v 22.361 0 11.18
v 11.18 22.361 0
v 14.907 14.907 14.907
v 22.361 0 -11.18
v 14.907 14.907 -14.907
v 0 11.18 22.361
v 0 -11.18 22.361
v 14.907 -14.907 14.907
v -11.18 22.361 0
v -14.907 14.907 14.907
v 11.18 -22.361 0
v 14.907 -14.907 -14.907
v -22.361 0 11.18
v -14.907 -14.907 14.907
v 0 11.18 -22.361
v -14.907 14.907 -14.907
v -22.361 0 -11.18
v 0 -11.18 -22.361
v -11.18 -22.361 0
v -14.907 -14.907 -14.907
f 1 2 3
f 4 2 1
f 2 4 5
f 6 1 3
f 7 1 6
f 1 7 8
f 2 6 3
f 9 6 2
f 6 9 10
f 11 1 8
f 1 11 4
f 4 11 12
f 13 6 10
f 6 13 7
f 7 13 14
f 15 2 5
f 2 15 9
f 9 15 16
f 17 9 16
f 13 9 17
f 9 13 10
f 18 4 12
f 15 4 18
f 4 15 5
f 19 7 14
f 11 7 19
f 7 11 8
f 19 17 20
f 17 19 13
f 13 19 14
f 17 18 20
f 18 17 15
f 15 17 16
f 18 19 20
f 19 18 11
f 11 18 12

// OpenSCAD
/*
  crystal solids via Miller indices 
  
   see http://kitwallace.tumblr.com/tagged/crystal 
   
   Kit Wallace October 2015
   
   systems
       cubic - complete 
       tetra  - only one class
   
   todo
      remaining classes
      deduce modifiers from crystal class   
      twinning
      get right/left or positive/negative terminology right 
*/


// some constants
PHI = (1 + sqrt(5))/2;

K=tan(60);

COLORS=["red","green","blue","gold","silver","pink","lightblue","orange","lightgreen","white"];

// basic functions

function flatten(l) = [ for (a = l) for (b = a) b ] ;

function vcontains(val,list) =
     search([val],list)[0] != [];
       
function distinct(list,dlist=[],i=0) =  // return only distinct items of list
      i==len(list)
         ? dlist
         : vcontains(list[i],dlist)
             ? distinct(list,dlist,i+1)
             : distinct(list,concat(dlist,[list[i]]),i+1)
      ;

function sum(list,i=0) =  
      i < len(list)
        ?  list[i] + sum(list,i+1)
        :  0;

// solid construction
  
module orient_to(centre, normal) {   
      translate(centre)
      rotate([0, 0, atan2(normal.y, normal.x)]) //rotation
      rotate([0, atan2(sqrt(pow(normal.x, 2)+pow(normal.y, 2)),normal.z), 0])
      children();
}

module face(normal, d=1, size=20) {
   orient_to([0,0,0],normal)
       translate([0,0, d + size/2])
            cube([10*size,10*size,size],center=true);
} 

module solid(faces,d=1,color="lightblue",size=40) {
 /* faces is a list of normals (Miller indices)
    d is either a scaler, the distance of each face from the origin or a list of distances, one for each face
 */  
 color(color)
    difference() {
     sphere(size,center=true);
     for(i = [0:len(faces)-1])  {
       face = faces[i];
       fd = len(d) == undef ? d : d[i];
       face(face,d=fd,size=size);
     }
 }
}

// functions to expand a form into faces using eg perms and combs

function perm3(l) =
// lazy until I code general perms with duplicates
 distinct(
   [[l[0],l[1],l[2]],
   [l[0],l[2],l[1]],
   [l[1],l[0],l[2]],
   [l[1],l[2],l[0]],
   [l[2],l[0],l[1]],
   [l[2],l[1],l[0]]
]);
        
function combs(list,n=0) =
   n < len(list)-1
   ? [for (j=list[n])
       for (sl= combs(list,n+1))
           concat(j,sl)
     ]
   : list[n] ;
 
       
function expand(list) =   
// needs a better name
  [for (x= list)
      x== 0 ? 0 : [x,-x]
  ];

// face generators
  
function shift(face,k=1) = [face[k%3],face[(k+1)%3],face[(k+2)%3]];
       
function cycle(face) =
    [face,shift(face,1),shift(face,2)];

function full_symmetry(form) =
   distinct(flatten([for (comb = combs(expand(form))) perm3(comb)]));
  
function tetra_symmetry(form) =
   distinct(flatten([for (face = [form,[form[1],form[0],form[2]]]) combs(expand(face))]));

function gyroid_symmetry(form,even=true) =
    concat(parity_filter(distinct(flatten([for (face = cycle(form)) combs(expand(face))])),even),
           parity_filter(distinct(flatten([for (face = cycle([form[0],form[2],-form[1]])) combs(expand(face))])), ! even)
    );

function opposite(face) =
   [for (a=face) 
       a==0 ? 0 : - a];

function mirror(face) =  [ face,opposite(face)];   

function switch(face) = [face[1],face[0],face[2]];

function trapezohedral_symmetry(form) =
 concat(
    parity_filter(combs(expand(form)),form),
    parity_filter(combs(expand(switch(form))),mirror(form))
    );
           
 // filters
           
function parity(face) =
    let(parity = sum( [for (i=face) i > 0 ? 1 : 0]))
    parity % 2 == 0 ;
 
function parity_filter(faces,form) =
    [for (face=faces) if (parity(face) == parity(form) ) face]; 

function unsigned(face) = [abs(face[0]),abs(face[1]),abs(face[2])];

function same_order(form,face) = 
    form == face || form==shift(face) || form==shift(shift(face));

function order_filter(faces,form) =
    [for (face=faces) 
        if (same_order(unsigned(form),unsigned(face))) face
    ];

function hemi_filter(faces,axis,form) =
     let(asign=sign(form[axis]))
     [for (face=faces) 
          if(sign(face[abs(axis)])==asign) face
     ];
          
// face construction      
function filter_faces(form,faces,modifiers,i=0) =
    i < len(modifiers)
       ? let(filter=modifiers[i])
         let(filtered_faces =
             filter=="order"
             ? order_filter(faces,form)
             : filter=="parity" 
             ? parity_filter(faces,form)
             : filter=="hemiz"
             ? hemi_filter(faces,2,form)
             : faces)
         filter_faces(form,filtered_faces,modifiers,i+1)
       : faces;
          
function form_faces(form,base,modifiers) =
    let(base_faces = 
         base=="full" 
       ? full_symmetry(form)
       : base=="tetra" 
       ? tetra_symmetry(form)
       : base=="gyroid"
       ? gyroid_symmetry(form)
       : base=="trapezoid" 
       ? trapezohedral_symmetry(form)
       : base=="mirror"
       ? mirror(form)
       : base=="pedion"
       ? [form]
       : [form])
     let(faces = filter_faces(form,base_faces,modifiers) )
     faces;

// crystal rendering

module c_render(crystal,pert=0) {
    forms=crystal[1];
    intersection_for (i=[0:len(forms)-1]) 
       c_render_part(crystal,i,pert);
}

module c_render_part(crystal,k,pert=0) {
    data=crystal[0];
    forms=crystal[1];
    scale(data[1])  
      {
         form_spec=forms[k];     
         form=form_spec[0];
         d=form_spec[1];
         base = form_spec[2] == "" || form_spec[2] == undef  ?  data[2] : form_spec[2];
         modifiers=form_spec[3] == undef ? [] : form_spec[3] ;  
         name = form_spec[4] == undef ? "" :   form_spec[4];     
         color = COLORS[k]== undef ? "green" : COLORS[k];
         faces=form_faces(form,base,modifiers);  
         echo(form_spec);
         echo(name,color,form,d+pert*rands(0,1,1)[0],base,modifiers, len(faces),faces);
         solid(faces,d,COLORS[k]);      
      }  
}

module c_animate(crystal) {
    n=len(crystal[1]);
    k=min(floor($t*n),n-1);
    c_render_part(crystal,k); 
}

// general classes 
// Cubic system

cubic_system = [
    ["cubic system",[1,1,1], "full"],
    [
      [[1,0,0],1,"",[],"cube"],
      [[1,1,0],1,"",[],"rhombdodecahedron"],
      [[1,2,0],1,"",[],"tetrahexahedron"],
      [[1,2,0],1,"",["order"],"pentagonal dodecahedron : right"],
      [[2,1,0],1,"",["order"],"pentagonal dodecahedron : left"],
      [[1,1,1],1,"",[],"octahedron"],
      [[1,1,1],1,"",["parity"],"tetrahedron :right"],
      [[1,-1,1],1,"",["parity"],"tetrahedron :left"],
      [[2,1,1],1,"",[],"icositetrahedron : hll h > l "],
      [[2,1,1],1,"",["parity"],"tristetrahedron : right"],
      [[2,-1,1],1,"",["parity"],"tristetrahedron: left"],
      [[2,2,1],1,"",[],"triakisoctahedron : hhl h > l "],
      [[2,2,1],1,"",["parity"],"deltoid dodecahedron :right"],
      [[2,-2,1],1,"",["parity"],"deltoid dodecahedron : left"],
      [[3,2,1],1,"",[],"hexakis octahedron"],
      [[3,2,1],1,"",["order"],"diakisdodecahedron : right"],
      [[3,1,2],1,"",["order"],"diakisdodecahedron : left"],
      [[3,2,1],1,"",["parity"], "hexatetrahedron : right"],
      [[3,-2,1],1,"",["parity"], "hexatetrahedron : left"],
      [[3,2,1],1,"gyroid",[], "pentagonal icositetrahedron - actually 4 enantiomorphs"],
      [[3,2,1],1,"",["parity","order"],"tetrahedral pentagonal dodecaheron: right"],
      [[2,-3,1],1,"",["parity","order"],"tetrahedral pentagonal dodecaheron : left"]
    ]
];

class_m3m = [
// cubic holosymmetric, hexakis octheral. galena type
    ["class_m3m",[1,1,1],"full"],
    [
      [[1,0,0],1],  // cube
      [[1,1,0],1],  // rhombdodecahedron
      [[1,2,0],1],  // tetrahexahedron
      [[1,1,1],1],  // octahedron
      [[2,1,1],1],  // hll h > l icositetrahedron
      [[2,2,1],1],  // hhl h > l triakisoctahedron
      [[3,2,1],1]   // hexoctahedron
    ]
    ]; 
garnet = [
// http://www.smorf.nl/index.php?crystal=Garnet_84
  ["garnet",[1,1,1],"full","m3m"],
  [
    [[3,2,1],1.04],
    [[2,1,1],1],
    [[1,1,0],1.047]
  ]
];

fluorite_2 = [
// http://www.smorf.nl/index.php?crystal=Fluorite_066
   ["Fluorite",[1,1,1],"full","m3m"],
   [
    [[2,2,1],1],
    [[1,1,1],1],
    [[1,1,0],0.97]
   ] 
];

galena=
// http://www.smorf.nl/index.php?crystal=Galena_023 
   [
     ["Galena",[1,1,1],"full","m3m"],
     [
        [[2,2,1],1],
        [[1,0,0],1.02]
     ]
];


analcime_05 = [
   ["Analcime_05",[1,1,1],"full","m3m"],
   [
      [[3,2,2],0.99],
      [[2,1,1],1]
   ]   
];

class_m3 = [
// cubic diakisdodecahedral, pyrite type
    ["class_m3m",[1,1,1],"full"],
    [
      [[1,0,0],1],  // cube
      [[1,1,0],1],  // rhombdodecahedron
      [[1,2,0],1,"",["order"]],  // pentagonal dodecahedron
      [[2,1,0],1,"",["order"]],  // pentagonal dodecahedron
      [[1,1,1],1],  // octahedron
      [[2,1,1],1],  // hll h > l icositetrahedron
      [[2,2,1],1],  // hhl h > l triakisoctahedron
      [[3,2,1],1,"",["order"]],   // diakisdodecahedron
      [[3,1,2],1,"",["order"]]   // diakisdodecahedron
   ]
 ]; 

pyrite_008= [
   ["Pyrite_008",[1,1,1],"full","m3"],
   [
      [[2,1,0],1,"",["order"]],
      [[1,1,1],0.76]
   ]  
];

class_43m = [
// cubic hexakishedral
// tetrahedrite type

    ["class_-43m",[1,1,1],"full"],
    [
      [[1,0,0],1],  // cube
      [[1,1,0],1],  // rhombdodecahedron
      [[2,1,0],1],  // tetrahexahedron
      [[1,1,1],1,"",["parity"]],  // tetrahedron
      [[1,-1,1],1,"",["parity"]],  // tetrahedron
      [[2,1,1],1,"",["parity"]],  // tristetrahedron
      [[2,-1,1],1,"",["parity"]],  // tristetrahedron
      [[2,2,1],1,"",["parity"]],  // deltoid dodecahedron
      [[2,-2,1],1,"",["parity"]],  // deltoid dodecahedron
      [[1,2,3],1,"",["parity"]],  // hexatetrahedron
      [[1,-2,3],1,"",["parity"]]    // hexatetrahedron
   ]
 ];
 
 sphalerite= [
// http://www.smorf.nl/index.php?crystal=Sphalerite_MA1
   ["sphalerite",[1,1,1],"full","-43m"],
   [
      [[1,1,1],1,"",["parity"]],
      [[1,-1,1],0.5,"",["parity"]]
   ]
];

boracite = [
// http://www.smorf.nl/index.php?crystal=Boracite_02
    ["boracite", [1,1,1],"full","-43m"],
    [ [[1,0,0],1],
      [[0,1,1],1.2],
      [[1,1,1],1.3,"",["parity"]]
    ]
];

tetrahedrite= [
//  http://www.smorf.nl/index.php?crystal=Tetrahedrite_034
  ["Tetrahedrite",[1,1,1],"full","-43m"],
  [
    [[3,3,2],1.03,"",["parity"]],
    [[3,1,0],1.2841],
    [[2,1,1],1,"",["parity"]],      // positive tetrakis tetrahedron
    [[2,-1,1],1.535,"",["parity"]], // negative tetrakis tetrahedron
    [[1,1,1],1,"",["parity"]] ,     // positive tetrahedron
    [[1,1,0],1.37],
    [[1,0,0],1.09]
  ]
];

class_432 = [
// pentagonal icositetrahedral
    ["class_432",[1,1,1],"full","432"],
    [
      [[1,0,0],1],  //cube
      [[1,1,0],1],  // rhombdodecahedron
      [[1,2,0],1],  //tetrahexahedron
      [[1,1,1],1],  // octahedron
      [[2,1,1],1],  // hll h > l icositetrahedron
      [[2,2,1],1],  // hhl h > l triakisoctahedron
      [[1,1,2],1],  // triakisoctahedron
      [[1,2,3],1,"gyroid"],   // pentagonal icositetrahedron - actually 4 enantiomorphs
   ]
    ];    

cuprite= [
// http://www.smorf.nl/?crystal=Cuprite_D1
    ["Cuprite",[1,1,1],"full", "432"],
    [ [[1,0,0],1],
      [[1,1,1],1.15],
      [[9,8,6],1.2,"gyroid"]
    ]
 ];
 
class_23 = [
// tetrahedral pentagonal dodecahedral
    ["class_23",[1,1,1],"full","23"],
    [
      [[1,0,0],1],  //cube
      [[1,1,0],1],  // rhombdodecahedron
      [[1,2,0],1,"",["order"]],  // pentagonal dodecahedron
      [[3,1,0],1,"",["order"]],  // pentagonal dodecahedron
      [[1,1,1],1,"",["parity"]],  // tetrahedron
      [[1,-1,1],1,"",["parity"]],  // tetrahedron
      [[2,2,1],1,"",["parity"]],  // deltoid dodecahedron
      [[2,-2,1],1,"",["parity"]],  // deltoid dodecahedron
      [[3,2,1],1,"",["parity","order"]],   // tetrahedral pentagonal dodecaheron
      [[2,-3,1],1,"",["parity","order"]],   // tetrahedral pentagonal dodecaheron
   ]
    ]; 

// Tetrahedral system
// class 4/mmm Tetragonal holosymmetric, ditetragonal bipyramidal, zircon type
// after Bishop p104 ff
class_4mmm= [
     ["Class 4mmm",[1,1,1.2],"tetra","4/mmm"],
     [
       [[1,0,0],1],  //tetragonal prism - first order
       [[1,1,0],1],  //tetragonal prism - second order
       [[0,0,1],1,"mirror"],  //pinacoid 
       [[5,1,0],1],  // Ditetragonal prism {hk0]
       [[2,0,1],1],  //tetragonal bipyramid first order
       [[3,3,1],1],  //tetragonal bipyramid second order
       [[1,2,3],1]  // ditetragonal bipyramid
    ]
];

zircon = [
// http://webmineral.com/data/Zircon.shtml
// http://www.thingiverse.com/thing:833494
// estimated distances
     ["zircon",[1,1,1],"tetra","4mmm"],
     [
       [[1,1,0],0.8],
       [[1,1,1],1.3],
       [[3,3,1],1]
      ]
];

    
anatase_36 = [
    ["Anatase_036",[1,1,2.514],"tetra","4mmm"],
    [[[1,0,1],1],
    [[1,0,7],0.3],
    [[1,1,14],0.27],
    [[0,1,14],0.265],
    [[1,1,2],0.97],
    [[[0,0,1]],0.25,"mirror"]
]];

anatase_003=[
   ["anatase_003",[1,1,2.514],"tetra","4mmm"],
   [
        [[1,0,1],1] 
    ]
];

anatase_033=[
   ["anatase_033",[1,1,2.514],"tetra","4mmm"],
   [
       [[1,0,1],1],
       [[1,1,2],1.1],
       [[1,0,3],0.95],
       [[0,0,1],0.855]
   ]  
];

anatase_036 = [
   ["anatase_036",[1,1,2.514],"tetra","4mmm"],
   [
      [[1,0,1],1.25],
      [[1,0,2],0.92],
      [[1,0,3],0.8],
      [[0,0,1],0.6]
   ]
];

anatase_053=[["anatase_53",[1,1,2.514],"tetra","4mmm"],
    [
     [[1,0,1],1],
     [[1,0,7],0.3],
     [[1,1,14],0.27],
     [[0,1,14],0.265],
     [[1,1,2],0.97],
     [[0,0,1],0.25]
    ]   
];

anatase_063 = [
    ["anatase_63",[1,1,2.514],"tetra","4mmm"],
    [
      [[1,0,0],1.27],
      [[1,0,1],0.92],
      [[1,1,2],0.97],
      [[3,0,7],0.62],
      [[3,3,2],1.47]
    ]
];
Cassiterite_D1 =[
["Cassiterite_D1",[1,1,0.673],"tetra","4mmm"],
[ 
  [[1,1,1],1],
  [[1,0,1],1]
]  
];

Calomel_D4=  [
 ["Calomel_D4", [4.45,4.45,10.89],"tetra","4mmm"],
 [
  [[1,1,0],0.8],
  [[1,0,0],1.05],
  [[2,0,1],1.05],
  [[1,0,1],1],
  [[1,0,3],0.85]
  ]   
 ];


class_422 = [
// tetragonal holoaxial, tetragonal trapezohedral
    ["class_422",[1,1,1.2],"tetra","422"],
    [
      [[1,0,0],1],  //tetragonal prism - first order
      [[1,1,0],1],   //tetragonal prism - second order
      [[0,0,1],1,"mirror"],  //pinacoid 
      [[2,1,0],1], // Ditetragonal prism {hk0]
      [[2,0,1],1],  // tetragonal bipyramid first order
      [[3,3,1],1],  // tetragonal bipyramid second order
      [[1,2,3],1,"trapezoid"]   // tetragonal trapesohedron
    ]
    ];

class_42m = [
// tetragonal holoaxial, tetragonal trapezohedral
    ["class_-42m",[1,1,1.2],"tetra","-42m"],
    [
      [[1,0,0],1],  //tetragonal prism - first order
      [[1,1,0],1],   //tetragonal prism - second order
      [[0,0,1],1,"mirror"],  //pinacoid 
      [[2,1,0],1], // Ditetragonal prism {hk0]
      [[2,0,1],1],  // tetragonal bipyramid first order
      [[2,2,1],1,"",["parity"]],  // tetragonal sphenoid
      [[3,2,1],1,"",["parity"]]   // tetragonal scalenohedron, ditetragonal bisphenoid
    ]
    ];
chalcopyrite = [ 
// http://www.smorf.nl/?crystal=Chalcopyrite_019
   ["Chalcopyrite", [1,1,1.966],"tetra","42m"],
   [
       [[1,1,2],1,"",["parity"]],
       [[1,1,-2],0.6,"",["parity"]]
   ]
   ];

chalcopyrite_037 = [ 
// http://www.smorf.nl/?crystal=Chalcopyrite_019
   ["Chalcopyrite", [1,1,1.966],"tetra","42m"],
   [  [[0,0,1],1],
       [[0,1,-1],1.49],
       [[ 0,1,1],1.5],
       [[1,1,-2],0.91,"",["parity"]],
       [[1,1,2],1.12,"",["parity"]]
   ]
   ];
   
class_4mm = [
// ditetragonal pyramidal
    ["class_-4m",[1,1,0.5],"tetra","4m"],
    [
      [[1,0,0],1],  //tetragonal prism - first order
      [[1,1,0],1],   //tetragonal prism - second order
      [[0,0,1],1,"pedion"],  // pedion
      [[0,0,-1],1,"pedion"],  //pedion
      [[2,1,0],1], // Ditetragonal prism {hk0]
      [[2,0,1],1,"",["hemiz"]],   // tetragonal pyramid
      [[2,0,-1],1,"",["hemiz"]],  // tetragonal pyramid
      [[2,2,1],1,"",["hemiz"]],   // tetragonal pyramid
      [[2,2,-1],1,"",["hemiz"]],  // tetragonal pyramid
      [[3,2,1],1,"",["hemiz"]],   // tetragonal scalenohedron, ditetragonal bisphenoid
      [[3,2,-1],1,"",["hemiz"]]   // tetragonal scalenohedron, ditetragonal 
    ]
    ];

diabolite =[
// Bishop fig 76 p 117
    ["diabolite",[1,1,1],"tetra","4mm"],
    [
      [[1,0,0],1],
      [[1,1,1],1,"",["hemiz"]],
      [[1,1,2],1,"",["hemiz"]],  
      [[1,1,2],1,"",["hemiz"]], 
      [[1,0,1],1,"",["hemiz"]], 
      [[2,0,1],1,"",["hemiz"]], 
      [[1,0,-1],1,"",["hemiz"]], 
      [[2,0,-1],1,"",["hemiz"]], 
      [[0,0,1],1,"pedion"],
      [[0,0,-1],1,"pedion"]
    ]
    ];
    
class_4m = [
// ditetragonal pyramidal
    ["class_4/m",[1,1,0.5],"tetra","4/m"],
    [
      [[1,0,0],1],  //tetragonal prism
      [[1,1,0],1],   //tetragonal prism 
      [[2,1,0],1],   //tetragonal prism 
      [[0,0,1],1,"mirror"],  // pedion
      [[2,0,1],1],  // tetragonal bipyramid 
      [[3,3,1],1],  // tetragonal bipyramid 
      [[1,2,3],1,,"",["order"]]   // tetragonal bipyramid

    ]
    ];

scapolite = [
// not correct
// http://www.smorf.nl/index.php?crystal=Scapolite_32
    ["class_4/m",[1,1,0.63],"tetra","4/m"],
    [
      [[1,0,0],1.01],  //tetragonal prism
      [[1,0,1],2.02],   //tetragonal prism 
      [[1,1,0],0.95],   //tetragonal prism 
      [[2,-1,1],1.6,"",["order"]],   // tetragonal bipyramid
      [[2,1,1.01],1.44,"",["order"]],   // tetragonal bipyramid
      [[3,0,1],1.41,"",["order"]],   // tetragonal bipyramid
      [[3,1,0],1.03,"",["order"]],   // tetragonal bipyramid

    ]
    ];

  

//scale(20)  c_render(tetrahedrite);
// scale(20) c_render(scapolite);
 scale(20) c_render_part(cubic_system,4);
// scale(20)  c_animate(cubic_system);
